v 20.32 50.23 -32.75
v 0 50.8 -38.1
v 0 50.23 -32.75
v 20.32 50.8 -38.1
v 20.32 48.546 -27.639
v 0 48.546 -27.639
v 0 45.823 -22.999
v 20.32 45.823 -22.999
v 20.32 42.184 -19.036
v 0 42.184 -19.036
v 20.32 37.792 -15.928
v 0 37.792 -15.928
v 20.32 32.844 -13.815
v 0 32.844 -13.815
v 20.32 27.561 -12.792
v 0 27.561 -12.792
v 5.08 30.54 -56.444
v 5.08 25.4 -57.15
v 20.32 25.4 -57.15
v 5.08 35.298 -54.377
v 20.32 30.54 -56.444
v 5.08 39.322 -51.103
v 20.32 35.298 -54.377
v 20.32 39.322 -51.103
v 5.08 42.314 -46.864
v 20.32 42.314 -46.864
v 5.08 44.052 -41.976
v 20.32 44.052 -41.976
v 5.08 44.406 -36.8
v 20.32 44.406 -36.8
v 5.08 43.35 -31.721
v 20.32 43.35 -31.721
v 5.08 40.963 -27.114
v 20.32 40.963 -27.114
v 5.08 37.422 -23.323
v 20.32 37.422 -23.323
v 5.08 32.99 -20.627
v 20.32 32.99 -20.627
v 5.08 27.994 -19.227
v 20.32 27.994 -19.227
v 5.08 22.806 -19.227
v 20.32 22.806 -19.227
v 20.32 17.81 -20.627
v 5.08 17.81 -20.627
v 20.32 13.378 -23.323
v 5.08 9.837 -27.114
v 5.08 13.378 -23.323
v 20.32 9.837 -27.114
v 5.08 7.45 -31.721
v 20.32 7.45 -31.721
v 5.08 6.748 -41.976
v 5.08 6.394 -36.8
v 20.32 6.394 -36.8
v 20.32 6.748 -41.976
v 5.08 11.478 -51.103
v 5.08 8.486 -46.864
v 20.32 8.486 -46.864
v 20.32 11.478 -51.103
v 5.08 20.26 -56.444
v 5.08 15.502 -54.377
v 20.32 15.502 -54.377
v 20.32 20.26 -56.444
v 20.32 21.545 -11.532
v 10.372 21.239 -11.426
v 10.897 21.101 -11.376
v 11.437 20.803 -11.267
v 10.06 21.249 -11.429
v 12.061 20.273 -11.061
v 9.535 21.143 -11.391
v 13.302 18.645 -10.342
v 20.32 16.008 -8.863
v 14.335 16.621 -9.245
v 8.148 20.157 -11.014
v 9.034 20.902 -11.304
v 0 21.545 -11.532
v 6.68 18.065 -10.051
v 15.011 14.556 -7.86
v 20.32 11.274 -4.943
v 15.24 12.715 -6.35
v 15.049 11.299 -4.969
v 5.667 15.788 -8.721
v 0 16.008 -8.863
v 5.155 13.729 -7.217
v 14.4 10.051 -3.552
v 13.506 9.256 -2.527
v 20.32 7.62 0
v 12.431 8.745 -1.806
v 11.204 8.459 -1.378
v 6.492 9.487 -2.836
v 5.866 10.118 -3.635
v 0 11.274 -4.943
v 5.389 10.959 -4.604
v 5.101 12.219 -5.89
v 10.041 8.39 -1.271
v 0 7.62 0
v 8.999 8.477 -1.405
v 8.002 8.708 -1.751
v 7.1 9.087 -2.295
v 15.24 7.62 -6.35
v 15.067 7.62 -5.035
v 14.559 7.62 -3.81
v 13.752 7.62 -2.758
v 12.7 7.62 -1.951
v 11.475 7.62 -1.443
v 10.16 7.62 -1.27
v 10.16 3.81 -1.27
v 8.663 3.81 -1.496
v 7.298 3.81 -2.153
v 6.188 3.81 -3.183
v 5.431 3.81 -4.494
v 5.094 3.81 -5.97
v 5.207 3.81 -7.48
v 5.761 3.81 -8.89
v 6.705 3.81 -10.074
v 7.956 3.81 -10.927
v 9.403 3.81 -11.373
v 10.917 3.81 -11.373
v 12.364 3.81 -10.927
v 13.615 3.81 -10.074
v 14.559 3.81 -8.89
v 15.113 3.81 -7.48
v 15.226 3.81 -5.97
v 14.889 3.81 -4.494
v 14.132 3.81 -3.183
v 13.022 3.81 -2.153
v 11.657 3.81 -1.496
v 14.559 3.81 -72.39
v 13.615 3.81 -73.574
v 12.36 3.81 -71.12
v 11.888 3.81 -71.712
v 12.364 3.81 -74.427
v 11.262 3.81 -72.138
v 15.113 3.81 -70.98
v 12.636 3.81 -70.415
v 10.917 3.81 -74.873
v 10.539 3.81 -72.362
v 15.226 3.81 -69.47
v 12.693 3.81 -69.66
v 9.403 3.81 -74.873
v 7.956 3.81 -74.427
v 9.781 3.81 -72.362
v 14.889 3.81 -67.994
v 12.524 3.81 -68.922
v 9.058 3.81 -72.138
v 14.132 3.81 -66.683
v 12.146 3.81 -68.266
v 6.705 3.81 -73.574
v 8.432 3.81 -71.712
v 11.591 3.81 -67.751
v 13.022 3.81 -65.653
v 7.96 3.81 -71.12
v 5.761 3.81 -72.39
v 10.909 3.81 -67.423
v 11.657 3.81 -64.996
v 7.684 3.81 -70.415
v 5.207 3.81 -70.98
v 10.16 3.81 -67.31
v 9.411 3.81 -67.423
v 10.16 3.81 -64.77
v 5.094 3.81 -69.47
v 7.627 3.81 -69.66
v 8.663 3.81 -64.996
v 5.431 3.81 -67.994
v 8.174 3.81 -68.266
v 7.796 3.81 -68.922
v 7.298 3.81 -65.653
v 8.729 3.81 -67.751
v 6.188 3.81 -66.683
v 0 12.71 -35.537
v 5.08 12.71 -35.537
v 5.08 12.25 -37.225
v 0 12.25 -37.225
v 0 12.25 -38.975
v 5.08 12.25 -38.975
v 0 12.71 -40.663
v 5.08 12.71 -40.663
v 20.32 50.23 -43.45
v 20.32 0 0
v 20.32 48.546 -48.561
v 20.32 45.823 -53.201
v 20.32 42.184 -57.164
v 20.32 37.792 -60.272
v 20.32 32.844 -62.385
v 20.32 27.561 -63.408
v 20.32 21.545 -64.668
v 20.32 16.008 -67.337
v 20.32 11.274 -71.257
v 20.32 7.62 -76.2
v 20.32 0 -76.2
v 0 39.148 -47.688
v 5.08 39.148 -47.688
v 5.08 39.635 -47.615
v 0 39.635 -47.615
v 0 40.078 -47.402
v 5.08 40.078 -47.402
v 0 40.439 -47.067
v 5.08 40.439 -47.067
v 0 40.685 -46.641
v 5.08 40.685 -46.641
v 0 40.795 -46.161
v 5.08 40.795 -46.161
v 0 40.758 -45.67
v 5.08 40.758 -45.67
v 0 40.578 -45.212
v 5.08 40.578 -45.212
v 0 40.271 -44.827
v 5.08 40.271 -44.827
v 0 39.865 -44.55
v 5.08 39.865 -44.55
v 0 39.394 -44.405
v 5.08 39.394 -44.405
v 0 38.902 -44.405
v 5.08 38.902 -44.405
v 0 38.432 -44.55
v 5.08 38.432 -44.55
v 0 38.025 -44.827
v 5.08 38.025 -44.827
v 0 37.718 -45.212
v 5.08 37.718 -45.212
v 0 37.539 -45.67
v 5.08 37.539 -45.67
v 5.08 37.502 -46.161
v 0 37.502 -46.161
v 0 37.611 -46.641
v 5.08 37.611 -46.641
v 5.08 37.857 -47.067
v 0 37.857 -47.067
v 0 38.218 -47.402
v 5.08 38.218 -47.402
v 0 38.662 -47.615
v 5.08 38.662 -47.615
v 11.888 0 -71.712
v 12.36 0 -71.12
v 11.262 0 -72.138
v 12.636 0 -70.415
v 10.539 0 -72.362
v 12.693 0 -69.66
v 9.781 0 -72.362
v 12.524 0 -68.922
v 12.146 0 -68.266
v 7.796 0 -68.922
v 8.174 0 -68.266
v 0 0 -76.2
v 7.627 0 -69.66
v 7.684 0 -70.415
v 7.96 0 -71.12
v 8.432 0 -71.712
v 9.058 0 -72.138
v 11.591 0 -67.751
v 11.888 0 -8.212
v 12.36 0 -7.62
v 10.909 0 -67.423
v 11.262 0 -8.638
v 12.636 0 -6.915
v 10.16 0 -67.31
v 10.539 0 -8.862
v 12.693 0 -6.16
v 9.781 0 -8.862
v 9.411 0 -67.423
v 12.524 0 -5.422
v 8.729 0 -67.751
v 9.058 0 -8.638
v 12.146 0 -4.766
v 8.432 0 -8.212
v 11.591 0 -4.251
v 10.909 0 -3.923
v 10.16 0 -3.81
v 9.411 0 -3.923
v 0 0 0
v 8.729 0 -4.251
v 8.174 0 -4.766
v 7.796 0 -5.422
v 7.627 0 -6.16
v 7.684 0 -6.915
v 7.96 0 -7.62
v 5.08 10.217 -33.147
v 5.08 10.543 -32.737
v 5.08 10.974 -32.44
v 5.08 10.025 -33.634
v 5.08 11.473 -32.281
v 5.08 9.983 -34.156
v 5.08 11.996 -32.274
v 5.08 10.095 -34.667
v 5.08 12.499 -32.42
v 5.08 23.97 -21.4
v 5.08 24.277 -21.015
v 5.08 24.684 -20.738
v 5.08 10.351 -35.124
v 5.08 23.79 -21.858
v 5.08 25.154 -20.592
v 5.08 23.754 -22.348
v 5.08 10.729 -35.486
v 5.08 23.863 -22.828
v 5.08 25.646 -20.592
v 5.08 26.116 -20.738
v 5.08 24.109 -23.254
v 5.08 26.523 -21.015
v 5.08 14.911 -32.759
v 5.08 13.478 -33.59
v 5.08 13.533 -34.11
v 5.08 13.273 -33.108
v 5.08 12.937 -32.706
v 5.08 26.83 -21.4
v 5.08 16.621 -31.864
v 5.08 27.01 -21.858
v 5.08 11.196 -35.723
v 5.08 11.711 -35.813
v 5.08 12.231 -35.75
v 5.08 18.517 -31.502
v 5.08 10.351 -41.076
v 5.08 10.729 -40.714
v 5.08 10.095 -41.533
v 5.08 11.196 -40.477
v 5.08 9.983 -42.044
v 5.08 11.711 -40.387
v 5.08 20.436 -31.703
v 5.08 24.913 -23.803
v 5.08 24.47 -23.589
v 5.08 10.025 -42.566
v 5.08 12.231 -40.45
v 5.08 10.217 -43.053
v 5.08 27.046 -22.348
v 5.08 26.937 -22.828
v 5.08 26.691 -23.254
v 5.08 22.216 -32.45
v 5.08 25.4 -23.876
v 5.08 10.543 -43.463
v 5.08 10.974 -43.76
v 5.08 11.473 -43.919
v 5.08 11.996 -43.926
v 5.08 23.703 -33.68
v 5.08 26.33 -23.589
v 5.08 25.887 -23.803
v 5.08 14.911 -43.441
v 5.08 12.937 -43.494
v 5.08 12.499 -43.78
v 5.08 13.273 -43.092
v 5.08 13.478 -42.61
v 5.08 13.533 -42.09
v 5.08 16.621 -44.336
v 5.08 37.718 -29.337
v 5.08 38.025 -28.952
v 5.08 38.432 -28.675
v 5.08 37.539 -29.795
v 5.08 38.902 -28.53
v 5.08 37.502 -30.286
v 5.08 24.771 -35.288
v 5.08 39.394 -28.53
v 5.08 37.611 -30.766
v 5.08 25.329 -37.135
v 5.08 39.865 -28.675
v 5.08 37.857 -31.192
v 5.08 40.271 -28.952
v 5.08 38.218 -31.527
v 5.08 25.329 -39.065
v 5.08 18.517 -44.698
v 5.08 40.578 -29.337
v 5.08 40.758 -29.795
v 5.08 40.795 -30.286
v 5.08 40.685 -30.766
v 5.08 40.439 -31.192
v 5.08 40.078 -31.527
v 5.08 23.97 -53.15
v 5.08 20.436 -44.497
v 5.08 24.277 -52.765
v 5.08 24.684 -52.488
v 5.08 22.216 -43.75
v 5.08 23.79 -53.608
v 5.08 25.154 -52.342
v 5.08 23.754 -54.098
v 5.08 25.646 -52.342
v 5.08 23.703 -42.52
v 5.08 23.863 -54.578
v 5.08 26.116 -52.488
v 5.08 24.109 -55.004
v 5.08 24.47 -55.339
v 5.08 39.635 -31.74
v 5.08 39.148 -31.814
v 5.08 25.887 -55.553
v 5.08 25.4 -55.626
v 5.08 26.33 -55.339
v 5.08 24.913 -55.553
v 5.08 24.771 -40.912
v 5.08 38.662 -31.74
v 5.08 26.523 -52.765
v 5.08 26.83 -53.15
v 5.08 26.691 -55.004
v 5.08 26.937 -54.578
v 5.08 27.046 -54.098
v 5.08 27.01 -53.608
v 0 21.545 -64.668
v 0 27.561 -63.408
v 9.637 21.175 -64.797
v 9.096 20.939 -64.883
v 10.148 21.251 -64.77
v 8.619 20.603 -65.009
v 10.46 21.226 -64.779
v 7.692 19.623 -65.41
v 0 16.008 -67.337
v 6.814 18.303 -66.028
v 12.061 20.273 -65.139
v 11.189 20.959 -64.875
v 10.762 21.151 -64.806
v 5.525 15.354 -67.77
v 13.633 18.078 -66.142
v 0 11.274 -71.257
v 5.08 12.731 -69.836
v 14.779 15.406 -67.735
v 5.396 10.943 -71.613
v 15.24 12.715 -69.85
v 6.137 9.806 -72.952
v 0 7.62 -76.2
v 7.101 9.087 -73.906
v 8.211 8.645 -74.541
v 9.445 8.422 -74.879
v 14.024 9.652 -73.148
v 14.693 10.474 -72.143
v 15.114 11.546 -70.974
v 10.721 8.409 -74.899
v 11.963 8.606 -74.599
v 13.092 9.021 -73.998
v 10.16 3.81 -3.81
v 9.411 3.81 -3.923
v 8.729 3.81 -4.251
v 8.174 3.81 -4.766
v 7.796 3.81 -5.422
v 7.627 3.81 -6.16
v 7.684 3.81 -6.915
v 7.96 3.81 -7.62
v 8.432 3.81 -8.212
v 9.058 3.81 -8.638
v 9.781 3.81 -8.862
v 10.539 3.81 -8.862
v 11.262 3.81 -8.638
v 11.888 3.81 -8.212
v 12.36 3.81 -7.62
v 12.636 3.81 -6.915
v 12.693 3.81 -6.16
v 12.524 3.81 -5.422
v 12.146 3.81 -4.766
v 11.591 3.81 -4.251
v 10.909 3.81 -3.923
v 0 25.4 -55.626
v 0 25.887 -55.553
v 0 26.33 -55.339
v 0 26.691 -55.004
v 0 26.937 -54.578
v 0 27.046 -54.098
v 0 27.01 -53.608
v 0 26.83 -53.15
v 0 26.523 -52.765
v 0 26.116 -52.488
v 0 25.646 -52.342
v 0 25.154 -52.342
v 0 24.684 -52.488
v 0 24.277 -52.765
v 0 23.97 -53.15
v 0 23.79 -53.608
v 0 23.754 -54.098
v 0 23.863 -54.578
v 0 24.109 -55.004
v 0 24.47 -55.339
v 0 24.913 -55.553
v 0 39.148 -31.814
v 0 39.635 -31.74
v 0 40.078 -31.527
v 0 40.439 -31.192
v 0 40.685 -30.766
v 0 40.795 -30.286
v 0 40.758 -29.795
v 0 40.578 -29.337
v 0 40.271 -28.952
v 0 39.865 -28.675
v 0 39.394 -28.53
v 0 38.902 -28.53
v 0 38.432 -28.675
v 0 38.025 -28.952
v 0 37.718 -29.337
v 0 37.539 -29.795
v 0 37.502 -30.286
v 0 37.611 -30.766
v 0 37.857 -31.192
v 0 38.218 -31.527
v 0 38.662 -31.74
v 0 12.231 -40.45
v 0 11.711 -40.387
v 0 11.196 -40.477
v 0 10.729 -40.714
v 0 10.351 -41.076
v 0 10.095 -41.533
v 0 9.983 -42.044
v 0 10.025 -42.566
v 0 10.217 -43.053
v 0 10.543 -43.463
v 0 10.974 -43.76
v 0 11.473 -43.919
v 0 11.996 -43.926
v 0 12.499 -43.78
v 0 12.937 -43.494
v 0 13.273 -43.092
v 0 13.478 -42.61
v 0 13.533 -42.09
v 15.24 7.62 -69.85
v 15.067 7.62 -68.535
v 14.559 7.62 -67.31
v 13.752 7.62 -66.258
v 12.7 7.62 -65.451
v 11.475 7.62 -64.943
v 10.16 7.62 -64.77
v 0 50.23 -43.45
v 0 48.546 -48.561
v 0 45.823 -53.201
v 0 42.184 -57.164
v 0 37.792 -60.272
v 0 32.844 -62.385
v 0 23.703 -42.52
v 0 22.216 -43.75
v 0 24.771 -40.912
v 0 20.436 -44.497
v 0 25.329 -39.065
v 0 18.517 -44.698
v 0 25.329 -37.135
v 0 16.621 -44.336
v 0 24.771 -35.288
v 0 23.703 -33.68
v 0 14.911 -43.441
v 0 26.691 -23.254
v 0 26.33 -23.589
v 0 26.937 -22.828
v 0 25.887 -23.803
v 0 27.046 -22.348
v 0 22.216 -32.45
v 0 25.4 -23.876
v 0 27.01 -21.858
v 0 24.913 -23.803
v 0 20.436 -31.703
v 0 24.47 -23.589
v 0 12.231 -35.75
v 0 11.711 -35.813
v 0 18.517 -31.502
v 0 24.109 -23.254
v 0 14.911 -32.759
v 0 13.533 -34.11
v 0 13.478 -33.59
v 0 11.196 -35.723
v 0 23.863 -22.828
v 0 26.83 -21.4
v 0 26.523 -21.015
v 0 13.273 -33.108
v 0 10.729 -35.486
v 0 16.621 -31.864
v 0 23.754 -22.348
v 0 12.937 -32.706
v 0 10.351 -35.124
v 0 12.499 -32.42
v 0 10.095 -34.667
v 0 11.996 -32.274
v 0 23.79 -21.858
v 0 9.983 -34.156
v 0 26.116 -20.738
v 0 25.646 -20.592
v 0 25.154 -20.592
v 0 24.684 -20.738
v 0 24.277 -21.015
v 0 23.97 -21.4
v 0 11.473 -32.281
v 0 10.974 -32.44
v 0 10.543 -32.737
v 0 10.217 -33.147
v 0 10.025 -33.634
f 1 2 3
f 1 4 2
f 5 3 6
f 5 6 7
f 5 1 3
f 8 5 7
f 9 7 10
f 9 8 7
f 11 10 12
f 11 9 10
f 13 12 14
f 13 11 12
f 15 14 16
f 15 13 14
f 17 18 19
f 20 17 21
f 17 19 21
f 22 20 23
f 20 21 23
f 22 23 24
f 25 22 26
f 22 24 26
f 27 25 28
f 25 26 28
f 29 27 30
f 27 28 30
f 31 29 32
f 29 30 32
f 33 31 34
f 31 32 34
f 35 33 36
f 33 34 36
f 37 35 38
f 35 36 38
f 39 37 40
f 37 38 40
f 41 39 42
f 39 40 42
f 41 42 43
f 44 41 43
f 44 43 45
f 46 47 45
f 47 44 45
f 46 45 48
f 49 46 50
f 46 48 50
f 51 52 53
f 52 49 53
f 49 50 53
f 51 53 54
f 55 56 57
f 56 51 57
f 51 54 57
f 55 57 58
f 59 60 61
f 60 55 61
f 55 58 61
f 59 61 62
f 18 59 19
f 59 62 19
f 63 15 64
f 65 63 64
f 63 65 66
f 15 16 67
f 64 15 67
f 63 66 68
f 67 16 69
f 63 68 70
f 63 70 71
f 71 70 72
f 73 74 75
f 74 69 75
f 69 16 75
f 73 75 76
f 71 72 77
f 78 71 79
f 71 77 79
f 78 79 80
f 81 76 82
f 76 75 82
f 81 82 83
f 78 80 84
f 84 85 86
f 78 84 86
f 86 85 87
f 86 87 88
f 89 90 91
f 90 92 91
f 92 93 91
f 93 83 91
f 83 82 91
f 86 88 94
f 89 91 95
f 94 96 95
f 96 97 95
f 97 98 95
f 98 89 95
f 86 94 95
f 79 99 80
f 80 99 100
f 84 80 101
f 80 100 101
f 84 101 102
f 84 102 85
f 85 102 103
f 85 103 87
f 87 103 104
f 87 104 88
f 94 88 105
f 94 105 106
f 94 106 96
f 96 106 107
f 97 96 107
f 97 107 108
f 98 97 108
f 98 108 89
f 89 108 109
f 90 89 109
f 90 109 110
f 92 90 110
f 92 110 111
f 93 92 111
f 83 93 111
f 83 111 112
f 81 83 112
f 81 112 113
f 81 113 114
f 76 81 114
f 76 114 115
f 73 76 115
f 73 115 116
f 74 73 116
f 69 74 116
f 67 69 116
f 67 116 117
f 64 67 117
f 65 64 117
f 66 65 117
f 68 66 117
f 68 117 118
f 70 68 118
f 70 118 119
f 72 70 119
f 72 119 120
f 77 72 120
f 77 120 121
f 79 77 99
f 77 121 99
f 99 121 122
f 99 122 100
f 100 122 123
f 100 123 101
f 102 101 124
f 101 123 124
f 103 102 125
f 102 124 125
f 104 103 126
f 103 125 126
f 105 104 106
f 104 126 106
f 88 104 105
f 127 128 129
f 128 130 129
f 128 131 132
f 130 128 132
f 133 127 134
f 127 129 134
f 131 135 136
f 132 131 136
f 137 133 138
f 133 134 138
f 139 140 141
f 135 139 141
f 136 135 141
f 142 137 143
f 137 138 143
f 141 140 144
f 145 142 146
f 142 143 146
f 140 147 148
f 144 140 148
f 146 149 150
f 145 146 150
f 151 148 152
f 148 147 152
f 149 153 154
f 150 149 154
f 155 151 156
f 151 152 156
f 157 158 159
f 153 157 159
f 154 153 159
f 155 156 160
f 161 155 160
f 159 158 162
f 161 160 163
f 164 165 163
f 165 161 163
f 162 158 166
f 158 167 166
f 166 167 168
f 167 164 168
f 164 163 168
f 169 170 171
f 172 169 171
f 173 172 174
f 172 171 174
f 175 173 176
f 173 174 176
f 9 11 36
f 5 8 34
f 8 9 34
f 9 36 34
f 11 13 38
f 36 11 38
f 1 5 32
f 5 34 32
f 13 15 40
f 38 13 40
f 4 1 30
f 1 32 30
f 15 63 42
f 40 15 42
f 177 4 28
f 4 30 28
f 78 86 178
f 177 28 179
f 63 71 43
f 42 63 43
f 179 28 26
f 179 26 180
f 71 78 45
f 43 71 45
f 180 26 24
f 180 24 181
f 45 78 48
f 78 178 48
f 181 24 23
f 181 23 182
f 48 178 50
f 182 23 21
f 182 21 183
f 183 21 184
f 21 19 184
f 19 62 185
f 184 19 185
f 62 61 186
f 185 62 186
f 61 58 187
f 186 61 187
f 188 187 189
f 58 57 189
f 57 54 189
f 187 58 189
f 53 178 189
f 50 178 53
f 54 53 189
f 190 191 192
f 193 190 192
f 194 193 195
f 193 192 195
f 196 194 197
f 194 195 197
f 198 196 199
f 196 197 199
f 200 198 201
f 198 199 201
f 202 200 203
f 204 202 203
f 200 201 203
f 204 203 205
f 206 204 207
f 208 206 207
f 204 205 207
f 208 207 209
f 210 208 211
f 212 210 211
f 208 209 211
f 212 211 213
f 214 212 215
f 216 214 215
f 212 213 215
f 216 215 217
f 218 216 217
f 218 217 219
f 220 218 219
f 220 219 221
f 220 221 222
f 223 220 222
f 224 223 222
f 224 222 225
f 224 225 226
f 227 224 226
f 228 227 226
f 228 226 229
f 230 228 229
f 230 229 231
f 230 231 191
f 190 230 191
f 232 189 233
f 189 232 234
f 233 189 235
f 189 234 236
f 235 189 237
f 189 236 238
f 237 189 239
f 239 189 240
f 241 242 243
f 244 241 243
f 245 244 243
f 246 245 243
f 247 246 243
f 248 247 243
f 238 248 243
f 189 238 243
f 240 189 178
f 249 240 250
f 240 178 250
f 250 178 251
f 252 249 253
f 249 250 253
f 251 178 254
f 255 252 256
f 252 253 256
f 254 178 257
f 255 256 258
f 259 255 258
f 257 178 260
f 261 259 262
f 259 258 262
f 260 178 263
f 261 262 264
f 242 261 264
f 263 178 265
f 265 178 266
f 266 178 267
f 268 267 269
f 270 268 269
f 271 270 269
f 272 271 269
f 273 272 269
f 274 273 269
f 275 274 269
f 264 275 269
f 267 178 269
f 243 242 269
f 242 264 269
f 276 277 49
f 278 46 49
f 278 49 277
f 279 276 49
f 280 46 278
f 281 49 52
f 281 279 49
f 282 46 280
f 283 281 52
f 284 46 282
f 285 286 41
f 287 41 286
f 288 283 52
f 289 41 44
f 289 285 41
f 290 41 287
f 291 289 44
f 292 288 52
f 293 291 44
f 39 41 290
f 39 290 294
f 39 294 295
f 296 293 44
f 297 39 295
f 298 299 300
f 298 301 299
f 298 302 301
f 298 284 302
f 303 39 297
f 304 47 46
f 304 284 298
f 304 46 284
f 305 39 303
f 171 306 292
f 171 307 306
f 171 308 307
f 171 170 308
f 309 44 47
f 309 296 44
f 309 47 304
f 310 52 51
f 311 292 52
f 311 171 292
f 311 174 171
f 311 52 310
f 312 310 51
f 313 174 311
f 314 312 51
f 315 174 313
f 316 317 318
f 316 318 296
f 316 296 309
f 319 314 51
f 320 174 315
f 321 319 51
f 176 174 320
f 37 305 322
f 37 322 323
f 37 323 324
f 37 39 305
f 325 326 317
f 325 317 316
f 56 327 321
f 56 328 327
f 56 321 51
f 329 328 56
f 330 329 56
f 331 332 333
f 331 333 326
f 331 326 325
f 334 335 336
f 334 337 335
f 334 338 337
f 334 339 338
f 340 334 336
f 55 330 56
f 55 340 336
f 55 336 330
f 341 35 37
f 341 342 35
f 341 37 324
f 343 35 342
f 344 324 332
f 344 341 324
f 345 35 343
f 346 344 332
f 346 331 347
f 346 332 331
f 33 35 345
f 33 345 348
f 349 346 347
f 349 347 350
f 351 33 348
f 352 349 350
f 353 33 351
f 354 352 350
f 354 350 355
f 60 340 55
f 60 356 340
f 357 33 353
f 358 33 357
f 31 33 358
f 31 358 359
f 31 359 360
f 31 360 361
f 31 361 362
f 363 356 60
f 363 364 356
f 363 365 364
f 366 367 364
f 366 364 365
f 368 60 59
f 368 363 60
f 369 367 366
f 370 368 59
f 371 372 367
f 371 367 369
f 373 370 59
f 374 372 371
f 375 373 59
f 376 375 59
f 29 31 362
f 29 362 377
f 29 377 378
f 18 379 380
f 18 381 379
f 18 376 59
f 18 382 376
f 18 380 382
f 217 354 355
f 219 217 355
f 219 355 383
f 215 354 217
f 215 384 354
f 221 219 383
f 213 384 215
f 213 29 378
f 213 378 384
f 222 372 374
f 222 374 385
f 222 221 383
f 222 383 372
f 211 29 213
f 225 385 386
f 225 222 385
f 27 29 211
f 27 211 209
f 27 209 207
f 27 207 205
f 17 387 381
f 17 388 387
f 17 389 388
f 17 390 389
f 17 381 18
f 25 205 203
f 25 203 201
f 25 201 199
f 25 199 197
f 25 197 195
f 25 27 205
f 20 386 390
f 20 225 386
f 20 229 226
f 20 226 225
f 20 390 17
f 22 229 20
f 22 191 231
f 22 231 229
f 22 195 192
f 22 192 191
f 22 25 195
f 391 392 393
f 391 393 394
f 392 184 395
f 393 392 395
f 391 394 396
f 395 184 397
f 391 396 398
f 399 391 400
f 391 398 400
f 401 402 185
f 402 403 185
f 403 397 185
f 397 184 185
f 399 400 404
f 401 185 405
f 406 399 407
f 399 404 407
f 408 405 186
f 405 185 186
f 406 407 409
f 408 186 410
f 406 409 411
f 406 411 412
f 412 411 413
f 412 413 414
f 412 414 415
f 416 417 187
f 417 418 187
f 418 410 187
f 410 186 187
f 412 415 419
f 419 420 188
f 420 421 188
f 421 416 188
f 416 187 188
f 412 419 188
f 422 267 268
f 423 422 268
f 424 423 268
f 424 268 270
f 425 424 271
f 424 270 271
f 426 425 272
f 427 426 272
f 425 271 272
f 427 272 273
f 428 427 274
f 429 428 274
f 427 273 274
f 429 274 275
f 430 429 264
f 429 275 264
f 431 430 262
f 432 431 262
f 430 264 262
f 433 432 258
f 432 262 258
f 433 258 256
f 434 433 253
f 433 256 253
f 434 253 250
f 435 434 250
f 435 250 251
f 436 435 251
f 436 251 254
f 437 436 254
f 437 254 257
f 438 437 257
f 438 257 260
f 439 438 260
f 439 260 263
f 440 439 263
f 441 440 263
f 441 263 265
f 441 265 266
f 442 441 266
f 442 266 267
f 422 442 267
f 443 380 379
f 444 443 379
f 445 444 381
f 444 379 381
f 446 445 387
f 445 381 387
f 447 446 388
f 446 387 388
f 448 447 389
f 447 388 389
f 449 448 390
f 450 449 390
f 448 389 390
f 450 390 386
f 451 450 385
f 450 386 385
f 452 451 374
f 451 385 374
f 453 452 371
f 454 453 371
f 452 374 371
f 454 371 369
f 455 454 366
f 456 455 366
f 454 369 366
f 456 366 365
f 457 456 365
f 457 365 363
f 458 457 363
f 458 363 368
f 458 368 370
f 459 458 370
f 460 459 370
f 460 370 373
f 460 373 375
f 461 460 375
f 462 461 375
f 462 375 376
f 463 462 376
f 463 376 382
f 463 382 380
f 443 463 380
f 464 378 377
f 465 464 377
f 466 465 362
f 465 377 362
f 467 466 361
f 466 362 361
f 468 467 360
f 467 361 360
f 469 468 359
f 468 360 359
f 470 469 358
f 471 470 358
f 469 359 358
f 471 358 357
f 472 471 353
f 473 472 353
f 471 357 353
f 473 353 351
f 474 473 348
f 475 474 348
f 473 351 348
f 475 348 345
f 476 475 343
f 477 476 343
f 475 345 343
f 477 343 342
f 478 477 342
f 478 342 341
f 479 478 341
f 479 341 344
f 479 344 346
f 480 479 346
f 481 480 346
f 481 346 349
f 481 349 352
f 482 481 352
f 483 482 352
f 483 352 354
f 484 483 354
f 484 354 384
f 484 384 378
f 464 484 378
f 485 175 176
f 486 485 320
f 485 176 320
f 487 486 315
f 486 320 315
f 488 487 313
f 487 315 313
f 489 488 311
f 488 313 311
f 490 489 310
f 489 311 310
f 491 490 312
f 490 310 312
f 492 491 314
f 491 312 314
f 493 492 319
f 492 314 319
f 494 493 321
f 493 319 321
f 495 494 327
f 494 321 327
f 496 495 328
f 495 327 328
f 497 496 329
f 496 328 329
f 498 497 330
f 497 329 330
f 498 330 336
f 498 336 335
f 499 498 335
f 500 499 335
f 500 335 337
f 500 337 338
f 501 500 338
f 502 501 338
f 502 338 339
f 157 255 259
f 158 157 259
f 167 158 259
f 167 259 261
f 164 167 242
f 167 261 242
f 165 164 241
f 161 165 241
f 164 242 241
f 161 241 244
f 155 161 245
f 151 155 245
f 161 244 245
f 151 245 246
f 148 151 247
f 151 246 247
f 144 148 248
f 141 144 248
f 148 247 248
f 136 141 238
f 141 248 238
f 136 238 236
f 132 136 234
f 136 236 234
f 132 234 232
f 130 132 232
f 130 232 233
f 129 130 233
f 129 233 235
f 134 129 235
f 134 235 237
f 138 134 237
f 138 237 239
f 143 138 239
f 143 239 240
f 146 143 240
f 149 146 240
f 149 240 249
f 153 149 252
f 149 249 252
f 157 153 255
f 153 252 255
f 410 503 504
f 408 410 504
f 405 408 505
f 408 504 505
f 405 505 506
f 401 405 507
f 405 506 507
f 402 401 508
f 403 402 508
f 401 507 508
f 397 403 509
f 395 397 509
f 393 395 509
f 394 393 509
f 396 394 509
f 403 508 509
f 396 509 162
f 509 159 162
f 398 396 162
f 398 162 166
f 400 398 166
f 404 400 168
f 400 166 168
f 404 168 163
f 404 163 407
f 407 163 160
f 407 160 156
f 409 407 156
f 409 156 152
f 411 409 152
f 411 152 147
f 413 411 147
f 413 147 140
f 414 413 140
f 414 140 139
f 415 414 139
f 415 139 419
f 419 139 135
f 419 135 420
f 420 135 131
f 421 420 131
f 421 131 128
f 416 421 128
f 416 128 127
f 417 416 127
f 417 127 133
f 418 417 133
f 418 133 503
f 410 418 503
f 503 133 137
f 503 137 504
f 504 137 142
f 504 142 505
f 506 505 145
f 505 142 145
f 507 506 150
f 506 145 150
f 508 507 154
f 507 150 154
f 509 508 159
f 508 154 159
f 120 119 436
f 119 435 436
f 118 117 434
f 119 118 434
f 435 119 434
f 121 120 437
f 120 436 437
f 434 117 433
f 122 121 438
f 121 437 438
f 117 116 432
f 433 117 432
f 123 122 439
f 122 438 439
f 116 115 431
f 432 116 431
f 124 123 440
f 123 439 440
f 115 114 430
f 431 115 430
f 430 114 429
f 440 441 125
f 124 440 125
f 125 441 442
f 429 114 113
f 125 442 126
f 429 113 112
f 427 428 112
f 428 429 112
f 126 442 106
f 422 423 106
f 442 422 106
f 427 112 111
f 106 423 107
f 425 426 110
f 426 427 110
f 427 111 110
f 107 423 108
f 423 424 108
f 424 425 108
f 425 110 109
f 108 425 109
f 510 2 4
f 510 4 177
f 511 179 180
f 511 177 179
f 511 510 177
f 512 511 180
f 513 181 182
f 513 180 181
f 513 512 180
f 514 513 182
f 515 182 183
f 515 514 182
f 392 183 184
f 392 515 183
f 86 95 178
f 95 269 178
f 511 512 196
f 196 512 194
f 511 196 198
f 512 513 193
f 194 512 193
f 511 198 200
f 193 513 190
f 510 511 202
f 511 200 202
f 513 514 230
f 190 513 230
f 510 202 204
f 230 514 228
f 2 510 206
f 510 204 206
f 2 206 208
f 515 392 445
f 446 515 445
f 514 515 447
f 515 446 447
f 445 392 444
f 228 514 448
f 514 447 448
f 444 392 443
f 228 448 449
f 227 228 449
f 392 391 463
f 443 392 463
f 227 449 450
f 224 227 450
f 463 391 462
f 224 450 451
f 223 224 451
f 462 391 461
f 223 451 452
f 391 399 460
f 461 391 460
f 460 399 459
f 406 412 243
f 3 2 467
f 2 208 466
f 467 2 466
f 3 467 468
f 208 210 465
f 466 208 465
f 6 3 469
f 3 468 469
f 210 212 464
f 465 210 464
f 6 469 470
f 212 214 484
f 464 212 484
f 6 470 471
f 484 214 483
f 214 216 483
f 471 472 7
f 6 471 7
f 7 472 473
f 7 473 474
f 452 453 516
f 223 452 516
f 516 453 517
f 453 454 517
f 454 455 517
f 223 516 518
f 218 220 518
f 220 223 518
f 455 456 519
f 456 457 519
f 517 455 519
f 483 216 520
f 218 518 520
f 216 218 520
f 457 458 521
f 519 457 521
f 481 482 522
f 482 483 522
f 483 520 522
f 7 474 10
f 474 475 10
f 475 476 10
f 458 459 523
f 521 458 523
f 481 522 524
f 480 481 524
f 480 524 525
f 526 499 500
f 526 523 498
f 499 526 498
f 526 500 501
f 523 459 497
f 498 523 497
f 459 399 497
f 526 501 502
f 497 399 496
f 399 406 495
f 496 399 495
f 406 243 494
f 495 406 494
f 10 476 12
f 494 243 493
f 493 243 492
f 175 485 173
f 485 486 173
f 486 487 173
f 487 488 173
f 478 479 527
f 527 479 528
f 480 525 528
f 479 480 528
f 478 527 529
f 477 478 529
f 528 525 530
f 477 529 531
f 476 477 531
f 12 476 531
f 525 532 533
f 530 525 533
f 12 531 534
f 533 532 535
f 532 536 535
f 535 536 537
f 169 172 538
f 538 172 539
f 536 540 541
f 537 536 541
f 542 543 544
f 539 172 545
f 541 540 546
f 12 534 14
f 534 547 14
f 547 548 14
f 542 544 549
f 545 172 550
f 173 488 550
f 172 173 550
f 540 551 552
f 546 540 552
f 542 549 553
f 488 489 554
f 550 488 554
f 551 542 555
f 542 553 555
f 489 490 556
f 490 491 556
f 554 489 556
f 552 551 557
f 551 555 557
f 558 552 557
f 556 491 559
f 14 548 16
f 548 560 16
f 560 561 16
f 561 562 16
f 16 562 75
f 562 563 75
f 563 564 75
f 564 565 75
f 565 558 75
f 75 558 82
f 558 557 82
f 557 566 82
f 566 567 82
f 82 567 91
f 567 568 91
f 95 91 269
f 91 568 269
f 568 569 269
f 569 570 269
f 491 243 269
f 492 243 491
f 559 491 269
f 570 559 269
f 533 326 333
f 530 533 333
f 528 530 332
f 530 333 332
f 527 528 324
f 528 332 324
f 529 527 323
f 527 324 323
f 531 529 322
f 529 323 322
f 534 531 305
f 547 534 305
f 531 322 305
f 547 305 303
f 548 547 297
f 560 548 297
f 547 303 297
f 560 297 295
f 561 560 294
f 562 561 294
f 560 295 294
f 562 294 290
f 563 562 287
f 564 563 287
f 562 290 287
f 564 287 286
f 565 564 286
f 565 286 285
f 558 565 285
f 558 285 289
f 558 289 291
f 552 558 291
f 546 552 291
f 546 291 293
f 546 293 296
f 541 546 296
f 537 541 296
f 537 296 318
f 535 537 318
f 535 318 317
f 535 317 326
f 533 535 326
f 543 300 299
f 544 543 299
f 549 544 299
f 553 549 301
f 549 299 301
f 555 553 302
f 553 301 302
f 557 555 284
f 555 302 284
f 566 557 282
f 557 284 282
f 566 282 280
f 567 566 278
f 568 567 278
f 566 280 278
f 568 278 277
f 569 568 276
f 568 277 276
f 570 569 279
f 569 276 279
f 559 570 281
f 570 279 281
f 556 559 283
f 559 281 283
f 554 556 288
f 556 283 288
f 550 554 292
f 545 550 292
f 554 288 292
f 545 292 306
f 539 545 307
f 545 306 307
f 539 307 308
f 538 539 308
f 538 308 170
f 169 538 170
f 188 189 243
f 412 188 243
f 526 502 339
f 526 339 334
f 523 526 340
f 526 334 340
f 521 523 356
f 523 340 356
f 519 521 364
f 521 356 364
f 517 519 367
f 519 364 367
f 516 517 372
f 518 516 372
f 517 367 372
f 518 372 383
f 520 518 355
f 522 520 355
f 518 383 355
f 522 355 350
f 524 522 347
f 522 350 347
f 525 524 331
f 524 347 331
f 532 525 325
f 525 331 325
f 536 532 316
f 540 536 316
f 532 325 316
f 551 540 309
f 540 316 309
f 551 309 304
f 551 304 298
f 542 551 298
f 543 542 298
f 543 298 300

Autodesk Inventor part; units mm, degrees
ref_plane "YZ Plane" through (0, 0, 0) normal (1, 0, 0) x (0, 1, 0)
ref_plane "XZ Plane" through (0, 0, 0) normal (0, 1, 0) x (-1, 0, 0)
ref_plane "XY Plane" through (0, 0, 0) normal (0, 0, 1) x (1, 0, 0)
sketch "Sketch1" plane through (0, 0, 0) normal (0, 1, 0) x (-1, 0, 0)
  line L0 (0, 0) -> (-20.32, 0)
  line L1 (-20.32, 0) -> (-20.32, -76.2)
  line L2 (-20.32, -76.2) -> (0, -76.2)
  line L3 (0, -76.2) -> (0, 0)
  dimension "d0" = 20.32
  dimension "d1" = 76.2
extrude "Extrusion1" add sketch "Sketch1" along normal blind 7.62
sketch "Sketch2" plane through (0, 7.62, 0) normal (0, 1, 0) x (1, 0, 0)
  line L0 (0, 0) -> (0, 12.7)
  line L1 (0, 12.7) -> (20.32, 12.7)
  line L2 (20.32, 12.7) -> (20.32, 63.5)
  line L3 (20.32, 63.5) -> (0, 63.5)
  line L4 (0, 63.5) -> (0, 12.7)
  dimension "d4" = 12.7
  dimension "d5" = 20.32
  dimension "d6" = 50.8
extrude "Extrusion2" add sketch "Sketch2" along normal blind 43.18
sketch "Sketch3" plane through (20.32, 0, 0) normal (1, 0, 0) x (0, 0, -1)
  line L0 (12.7, 50.8) -> (63.5, 50.8) projected
  line L1 (38.1, 50.8) -> (38.1, 25.4)
  circle A0 centre (38.1, 25.4) radius 19.05
  point P0 (0, 0)
  dimension "d9" = 25.4
  dimension "d10" = 38.1
extrude "Extrusion3" cut sketch "Sketch3" against normal blind 15.24
fillet "Fillet1" radius 25.4 2 edges at (10.16, 50.8, -63.5) (10.16, 50.8, -12.7)
sketch "Sketch6" plane through (0, 7.62, 0) normal (0, 1, 0) x (1, 0, 0)
  line L0 (0, 0) -> (20.32, 0) projected
  line L1 (10.16, 0) -> (10.16, 6.35)
  line L2 (20.32, 76.2) -> (0, 76.2) projected
  line L3 (10.16, 76.2) -> (10.16, 69.85)
  dimension "d20" = 6.35
  dimension "d21" = 6.35
fillet "Fillet2" radius 25.4 2 edges at (10.16, 7.62, -63.5) (10.16, 7.62, -12.7)
hole "Hole1" at (10.16, 7.62, -6.35) at (10.16, 7.62, -69.85) direction (0, -1, 0) diameter 5.08 end through all counterbore diameter 10.16 counterbore depth 3.81
sketch "Sketch7" plane through (10.16, 7.62, -6.35) normal (0, -1, 0) x (1, 0, 0)
  circle A0 centre (0, 0) radius 5.08
  circle A1 centre (0, -63.5) radius 2.54 projected
  line L0 (-2.54, -63.5) -> (0, -63.5)
  circle A2 centre (0, -63.5) radius 5.08
  point P0 (-10.16, 6.35)
  dimension "d30" = 10.16
  dimension "d31" = 10.16
extrude "Extrusion5" cut sketch "Sketch7" against normal blind 15.24 contours A0 | A1 | A2
sketch "Sketch9" plane through (5.08, 25.4, -38.1) normal (1, 0, 0) x (0, 0, -1)
  line L0 (0, 0) -> (0, -6.604)
  circle A0 centre (0, -6.604) radius 6.604
  line L1 (0, -6.604) -> (-3.302, -12.3232)
  line L2 (0, -6.604) -> (6.604, -6.604) construction
  line L3 (0, -6.604) -> (3.302, -12.3232)
  line L4 (0, -6.604) -> (6.604, -6.604) construction
  line L5 (-3.302, -12.3232) -> (-4.064, -13.6431)
  line L6 (3.302, -12.3232) -> (4.064, -13.6431)
  line L7 (3.302, -12.3232) -> (4.826, -12.3232) construction
  circle A1 centre (-4.064, -13.6431) radius 1.778
  circle A2 centre (4.064, -13.6431) radius 1.778
  circle A3 centre (0, 0) radius 19.05 projected
  line L8 (-19.05, 0) -> (-17.526, 0)
  line L9 (-17.526, 0) -> (-15.875, 0)
  circle A4 centre (-15.875, 0) radius 1.651
  line L10 (19.05, 0) -> (17.526, 0)
  line L11 (17.526, 0) -> (15.875, 0)
  circle A5 centre (15.875, 0) radius 1.651
  line L12 (0, 0) -> (-9.525, 16.4978)
  line L13 (0, 0) -> (9.525, 16.4978)
  line L14 (-9.525, 16.4978) -> (-8.763, 15.178)
  line L15 (-8.763, 15.178) -> (-7.9375, 13.7482)
  line L16 (9.525, 16.4978) -> (8.763, 15.178)
  line L17 (8.763, 15.178) -> (7.9375, 13.7482)
  circle A6 centre (-7.9375, 13.7482) radius 1.651
  circle A7 centre (7.9375, 13.7482) radius 1.651
  point P0 (-38.1, -25.4)
  point P1 (-2.5627, -12.6905)
  point P2 (2.5627, -12.6905)
  point P3 (3.9897, -11.8666)
  point P4 (-3.9897, -11.8666)
  dimension "d47" = 6.604
  dimension "d48" = 120
  dimension "d49" = 60
  dimension "d50" = 1.524
  dimension "d51" = 1.524
  dimension "d52" = 60
  dimension "d53" = 3.556
  dimension "d54" = 3.556
  dimension "d55" = 1.524
  dimension "d56" = 1.651
  dimension "d57" = 1.524
  dimension "d58" = 1.651
  dimension "d59" = 1.524
  dimension "d60" = 1.651
  dimension "d61" = 1.524
  dimension "d62" = 1.651
extrude "Extrusion7" cut sketch "Sketch9" against normal blind 25.4 contours A0 A2 L3 L0 | L0 L1 A1 A0 | L3 A2 A0 A1 L1 | A1 L1 A0 | A0 A1 | A6 L12 | L12 A6 | A7 L13 | L13 A7 | A1 A0 L1 | A2 A0 L3 | L3 A0 A2 | A2 A0 | A4 | A5
properties part number "Motor Mount V2"
